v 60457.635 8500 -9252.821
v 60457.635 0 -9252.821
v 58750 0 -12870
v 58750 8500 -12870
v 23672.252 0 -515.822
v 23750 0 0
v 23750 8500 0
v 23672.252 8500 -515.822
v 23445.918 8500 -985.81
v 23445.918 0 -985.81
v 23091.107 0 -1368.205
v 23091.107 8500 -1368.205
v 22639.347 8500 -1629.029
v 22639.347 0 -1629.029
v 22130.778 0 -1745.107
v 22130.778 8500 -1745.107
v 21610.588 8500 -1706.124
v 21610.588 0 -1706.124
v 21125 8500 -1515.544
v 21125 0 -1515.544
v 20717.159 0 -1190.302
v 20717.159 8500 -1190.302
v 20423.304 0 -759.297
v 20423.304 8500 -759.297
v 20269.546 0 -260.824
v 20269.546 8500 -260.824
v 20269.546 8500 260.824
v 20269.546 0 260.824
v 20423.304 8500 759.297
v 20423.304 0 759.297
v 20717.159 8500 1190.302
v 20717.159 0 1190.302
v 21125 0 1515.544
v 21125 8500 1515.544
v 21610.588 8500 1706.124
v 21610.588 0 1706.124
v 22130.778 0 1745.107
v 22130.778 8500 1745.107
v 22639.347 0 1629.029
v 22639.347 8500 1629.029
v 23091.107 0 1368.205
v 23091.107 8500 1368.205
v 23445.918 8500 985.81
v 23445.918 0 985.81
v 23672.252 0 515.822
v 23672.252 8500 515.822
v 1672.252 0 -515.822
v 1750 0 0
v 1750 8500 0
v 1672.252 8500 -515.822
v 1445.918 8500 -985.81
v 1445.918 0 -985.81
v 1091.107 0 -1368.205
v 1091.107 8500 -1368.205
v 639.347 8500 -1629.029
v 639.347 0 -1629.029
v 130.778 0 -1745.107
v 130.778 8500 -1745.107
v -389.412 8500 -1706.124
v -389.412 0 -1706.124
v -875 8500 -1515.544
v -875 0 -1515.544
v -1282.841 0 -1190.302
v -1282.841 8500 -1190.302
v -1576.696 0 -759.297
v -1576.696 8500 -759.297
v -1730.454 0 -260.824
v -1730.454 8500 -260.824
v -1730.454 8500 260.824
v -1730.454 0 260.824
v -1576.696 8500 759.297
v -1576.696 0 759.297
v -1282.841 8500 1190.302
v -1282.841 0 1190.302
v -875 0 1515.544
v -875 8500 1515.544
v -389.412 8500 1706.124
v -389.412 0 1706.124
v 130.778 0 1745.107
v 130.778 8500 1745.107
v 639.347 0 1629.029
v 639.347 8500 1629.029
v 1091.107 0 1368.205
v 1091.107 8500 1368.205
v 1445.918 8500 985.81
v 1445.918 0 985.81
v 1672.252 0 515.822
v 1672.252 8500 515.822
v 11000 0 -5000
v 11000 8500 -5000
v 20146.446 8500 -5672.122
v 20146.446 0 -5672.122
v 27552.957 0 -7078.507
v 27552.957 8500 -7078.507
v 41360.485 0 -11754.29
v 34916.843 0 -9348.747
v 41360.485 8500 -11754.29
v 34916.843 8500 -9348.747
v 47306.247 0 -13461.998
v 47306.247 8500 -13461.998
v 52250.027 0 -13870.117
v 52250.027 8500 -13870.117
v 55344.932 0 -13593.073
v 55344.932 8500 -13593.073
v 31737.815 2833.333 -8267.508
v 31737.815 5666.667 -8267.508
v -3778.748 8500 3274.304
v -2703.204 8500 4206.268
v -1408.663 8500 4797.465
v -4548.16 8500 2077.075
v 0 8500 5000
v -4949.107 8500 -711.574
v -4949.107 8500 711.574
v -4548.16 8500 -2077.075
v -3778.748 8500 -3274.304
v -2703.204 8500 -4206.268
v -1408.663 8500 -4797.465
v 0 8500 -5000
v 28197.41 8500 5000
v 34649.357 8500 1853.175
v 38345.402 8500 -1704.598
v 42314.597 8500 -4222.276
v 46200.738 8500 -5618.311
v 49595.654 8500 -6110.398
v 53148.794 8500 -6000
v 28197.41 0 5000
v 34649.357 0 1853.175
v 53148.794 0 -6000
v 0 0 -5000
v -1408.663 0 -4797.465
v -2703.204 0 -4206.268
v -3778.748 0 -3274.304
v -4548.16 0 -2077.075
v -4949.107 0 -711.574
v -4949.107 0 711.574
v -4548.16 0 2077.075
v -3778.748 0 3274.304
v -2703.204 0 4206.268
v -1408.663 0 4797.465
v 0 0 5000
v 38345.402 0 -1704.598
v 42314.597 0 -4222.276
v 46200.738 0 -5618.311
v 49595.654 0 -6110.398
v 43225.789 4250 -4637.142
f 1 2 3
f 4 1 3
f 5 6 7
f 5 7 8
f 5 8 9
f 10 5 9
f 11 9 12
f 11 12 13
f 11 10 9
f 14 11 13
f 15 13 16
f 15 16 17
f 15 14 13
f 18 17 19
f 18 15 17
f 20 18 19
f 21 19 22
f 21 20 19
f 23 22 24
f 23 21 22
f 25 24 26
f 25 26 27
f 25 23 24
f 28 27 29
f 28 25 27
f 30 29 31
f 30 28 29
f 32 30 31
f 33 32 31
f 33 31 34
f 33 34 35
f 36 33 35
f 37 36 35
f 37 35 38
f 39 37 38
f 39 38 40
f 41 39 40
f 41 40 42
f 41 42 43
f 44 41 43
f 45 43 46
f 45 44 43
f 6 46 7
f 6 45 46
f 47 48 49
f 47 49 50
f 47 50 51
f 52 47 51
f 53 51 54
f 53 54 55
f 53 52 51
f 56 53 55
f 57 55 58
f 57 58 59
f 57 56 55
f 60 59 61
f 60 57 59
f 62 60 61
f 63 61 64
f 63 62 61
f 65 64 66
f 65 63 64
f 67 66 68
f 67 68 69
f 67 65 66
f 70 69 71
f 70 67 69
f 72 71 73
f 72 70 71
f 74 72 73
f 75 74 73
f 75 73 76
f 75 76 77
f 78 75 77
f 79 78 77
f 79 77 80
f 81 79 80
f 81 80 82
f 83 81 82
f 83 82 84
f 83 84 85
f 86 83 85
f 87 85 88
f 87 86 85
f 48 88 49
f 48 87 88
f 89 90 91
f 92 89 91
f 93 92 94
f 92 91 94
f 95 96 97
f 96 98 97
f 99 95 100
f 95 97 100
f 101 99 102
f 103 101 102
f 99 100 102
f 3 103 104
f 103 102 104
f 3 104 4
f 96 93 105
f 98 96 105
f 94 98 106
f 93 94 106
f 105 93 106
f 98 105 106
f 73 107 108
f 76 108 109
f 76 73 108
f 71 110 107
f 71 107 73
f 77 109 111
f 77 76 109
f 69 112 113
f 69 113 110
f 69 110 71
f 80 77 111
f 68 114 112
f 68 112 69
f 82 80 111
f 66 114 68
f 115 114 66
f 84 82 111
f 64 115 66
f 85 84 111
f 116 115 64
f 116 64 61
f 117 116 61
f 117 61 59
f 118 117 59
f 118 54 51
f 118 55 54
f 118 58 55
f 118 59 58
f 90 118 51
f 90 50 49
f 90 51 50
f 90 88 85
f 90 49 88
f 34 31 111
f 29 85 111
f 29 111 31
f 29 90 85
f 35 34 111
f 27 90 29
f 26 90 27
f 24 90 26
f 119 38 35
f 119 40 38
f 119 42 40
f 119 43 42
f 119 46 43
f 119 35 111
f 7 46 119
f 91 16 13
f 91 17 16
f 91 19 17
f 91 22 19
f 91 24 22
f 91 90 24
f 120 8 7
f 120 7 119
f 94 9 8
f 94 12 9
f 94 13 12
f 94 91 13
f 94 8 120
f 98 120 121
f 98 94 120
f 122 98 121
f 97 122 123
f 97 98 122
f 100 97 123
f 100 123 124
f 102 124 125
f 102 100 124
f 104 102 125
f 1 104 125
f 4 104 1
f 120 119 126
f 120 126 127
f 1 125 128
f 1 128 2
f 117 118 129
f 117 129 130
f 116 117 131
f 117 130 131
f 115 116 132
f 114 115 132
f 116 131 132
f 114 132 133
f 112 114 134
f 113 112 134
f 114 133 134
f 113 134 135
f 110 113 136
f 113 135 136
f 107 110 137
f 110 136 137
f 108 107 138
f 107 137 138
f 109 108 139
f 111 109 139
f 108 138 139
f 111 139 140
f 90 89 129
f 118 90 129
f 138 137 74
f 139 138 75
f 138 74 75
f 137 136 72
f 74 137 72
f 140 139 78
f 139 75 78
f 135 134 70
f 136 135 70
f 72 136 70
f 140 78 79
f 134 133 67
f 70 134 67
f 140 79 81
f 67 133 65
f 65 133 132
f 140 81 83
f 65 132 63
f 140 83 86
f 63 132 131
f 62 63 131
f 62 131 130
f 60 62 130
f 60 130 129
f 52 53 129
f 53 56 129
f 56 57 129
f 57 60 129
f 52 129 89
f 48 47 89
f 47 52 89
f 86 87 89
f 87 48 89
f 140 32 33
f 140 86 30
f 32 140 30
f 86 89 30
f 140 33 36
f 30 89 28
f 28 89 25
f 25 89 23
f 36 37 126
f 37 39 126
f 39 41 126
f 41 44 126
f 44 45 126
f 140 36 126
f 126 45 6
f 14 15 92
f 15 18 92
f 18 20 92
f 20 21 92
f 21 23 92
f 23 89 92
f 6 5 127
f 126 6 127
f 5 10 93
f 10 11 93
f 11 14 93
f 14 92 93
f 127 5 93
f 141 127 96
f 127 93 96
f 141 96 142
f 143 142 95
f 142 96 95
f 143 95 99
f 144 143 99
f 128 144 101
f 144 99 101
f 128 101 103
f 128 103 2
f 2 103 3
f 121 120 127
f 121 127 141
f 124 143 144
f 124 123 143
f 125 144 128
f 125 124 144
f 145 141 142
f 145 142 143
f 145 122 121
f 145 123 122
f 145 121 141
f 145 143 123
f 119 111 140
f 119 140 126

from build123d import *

# Parameters (mm, degrees)
SKETCH1_R           = 5000
SKETCH1_R_2         = 1750
BOSS_EXTRUDE1_DEPTH = 8500
BOSS_EXTRUDE2_DEPTH = 8500


with BuildPart() as part:
    # Sketch1 → Boss-Extrude1 (new body)
    with BuildSketch(Plane(origin=(0, 0, 0), x_dir=(1, 0, 0), z_dir=(0, 1, 0))):
        Circle(SKETCH1_R)
        Circle(SKETCH1_R_2, mode=Mode.SUBTRACT)
        with BuildLine():
            Line((22000, 5000), (-4.2951e-05, 5000))
            ThreePointArc((-4.2951e-05, 5000), (3535.533890747, 3535.533921118), (5000, 0))
            ThreePointArc((5000, 0), (3535.533905933, -3535.533905933), (0, -5000))
            Line((0, -5000), (22000, -5000))
            ThreePointArc((22000, -5000), (17000, 0), (22000, 5000))
        make_face()
        with Locations((22000, 0)):
            Circle(SKETCH1_R)
        with Locations((22000, 0)):
            Circle(SKETCH1_R_2, mode=Mode.SUBTRACT)
    extrude(amount=BOSS_EXTRUDE1_DEPTH)

    # Sketch2 → Boss-Extrude2 (add)
    with BuildSketch(Plane(origin=(0, 8500, 0), x_dir=(1, 0, 0), z_dir=(0, 1, 0))):
        with BuildLine():
            Line((22000, -5000), (28197.409679947, -5000))
            Line((28197.409679947, -5000), (34649.356853801, -1853.175103606))
            add(Edge.make_bspline(
                [(34649.356853801, -1853.175103606), (42552.502002918, 7200.871322652), (53148.794169675, 6000)],
                knots=[0, 0, 0, 1, 1, 1], degree=2))
            Line((53148.794169675, 6000), (60457.635009592, 9252.821171961))
            Line((60457.635009592, 9252.821171961), (58750, 12870))
            add(Edge.make_bspline(
                [(11000, 5000), (38094.669145956, 5526.947568374), (42172.496557994, 17338.223006618), (58750, 12870)],
                knots=[0, 0, 0, 0, 1, 1, 1, 1], degree=3))
            Line((11000, 5000), (22000, 5000))
            ThreePointArc((22000, 5000), (27000, 0), (22000, -5000))
        make_face()
    extrude(amount=-BOSS_EXTRUDE2_DEPTH)


solid = part.part
